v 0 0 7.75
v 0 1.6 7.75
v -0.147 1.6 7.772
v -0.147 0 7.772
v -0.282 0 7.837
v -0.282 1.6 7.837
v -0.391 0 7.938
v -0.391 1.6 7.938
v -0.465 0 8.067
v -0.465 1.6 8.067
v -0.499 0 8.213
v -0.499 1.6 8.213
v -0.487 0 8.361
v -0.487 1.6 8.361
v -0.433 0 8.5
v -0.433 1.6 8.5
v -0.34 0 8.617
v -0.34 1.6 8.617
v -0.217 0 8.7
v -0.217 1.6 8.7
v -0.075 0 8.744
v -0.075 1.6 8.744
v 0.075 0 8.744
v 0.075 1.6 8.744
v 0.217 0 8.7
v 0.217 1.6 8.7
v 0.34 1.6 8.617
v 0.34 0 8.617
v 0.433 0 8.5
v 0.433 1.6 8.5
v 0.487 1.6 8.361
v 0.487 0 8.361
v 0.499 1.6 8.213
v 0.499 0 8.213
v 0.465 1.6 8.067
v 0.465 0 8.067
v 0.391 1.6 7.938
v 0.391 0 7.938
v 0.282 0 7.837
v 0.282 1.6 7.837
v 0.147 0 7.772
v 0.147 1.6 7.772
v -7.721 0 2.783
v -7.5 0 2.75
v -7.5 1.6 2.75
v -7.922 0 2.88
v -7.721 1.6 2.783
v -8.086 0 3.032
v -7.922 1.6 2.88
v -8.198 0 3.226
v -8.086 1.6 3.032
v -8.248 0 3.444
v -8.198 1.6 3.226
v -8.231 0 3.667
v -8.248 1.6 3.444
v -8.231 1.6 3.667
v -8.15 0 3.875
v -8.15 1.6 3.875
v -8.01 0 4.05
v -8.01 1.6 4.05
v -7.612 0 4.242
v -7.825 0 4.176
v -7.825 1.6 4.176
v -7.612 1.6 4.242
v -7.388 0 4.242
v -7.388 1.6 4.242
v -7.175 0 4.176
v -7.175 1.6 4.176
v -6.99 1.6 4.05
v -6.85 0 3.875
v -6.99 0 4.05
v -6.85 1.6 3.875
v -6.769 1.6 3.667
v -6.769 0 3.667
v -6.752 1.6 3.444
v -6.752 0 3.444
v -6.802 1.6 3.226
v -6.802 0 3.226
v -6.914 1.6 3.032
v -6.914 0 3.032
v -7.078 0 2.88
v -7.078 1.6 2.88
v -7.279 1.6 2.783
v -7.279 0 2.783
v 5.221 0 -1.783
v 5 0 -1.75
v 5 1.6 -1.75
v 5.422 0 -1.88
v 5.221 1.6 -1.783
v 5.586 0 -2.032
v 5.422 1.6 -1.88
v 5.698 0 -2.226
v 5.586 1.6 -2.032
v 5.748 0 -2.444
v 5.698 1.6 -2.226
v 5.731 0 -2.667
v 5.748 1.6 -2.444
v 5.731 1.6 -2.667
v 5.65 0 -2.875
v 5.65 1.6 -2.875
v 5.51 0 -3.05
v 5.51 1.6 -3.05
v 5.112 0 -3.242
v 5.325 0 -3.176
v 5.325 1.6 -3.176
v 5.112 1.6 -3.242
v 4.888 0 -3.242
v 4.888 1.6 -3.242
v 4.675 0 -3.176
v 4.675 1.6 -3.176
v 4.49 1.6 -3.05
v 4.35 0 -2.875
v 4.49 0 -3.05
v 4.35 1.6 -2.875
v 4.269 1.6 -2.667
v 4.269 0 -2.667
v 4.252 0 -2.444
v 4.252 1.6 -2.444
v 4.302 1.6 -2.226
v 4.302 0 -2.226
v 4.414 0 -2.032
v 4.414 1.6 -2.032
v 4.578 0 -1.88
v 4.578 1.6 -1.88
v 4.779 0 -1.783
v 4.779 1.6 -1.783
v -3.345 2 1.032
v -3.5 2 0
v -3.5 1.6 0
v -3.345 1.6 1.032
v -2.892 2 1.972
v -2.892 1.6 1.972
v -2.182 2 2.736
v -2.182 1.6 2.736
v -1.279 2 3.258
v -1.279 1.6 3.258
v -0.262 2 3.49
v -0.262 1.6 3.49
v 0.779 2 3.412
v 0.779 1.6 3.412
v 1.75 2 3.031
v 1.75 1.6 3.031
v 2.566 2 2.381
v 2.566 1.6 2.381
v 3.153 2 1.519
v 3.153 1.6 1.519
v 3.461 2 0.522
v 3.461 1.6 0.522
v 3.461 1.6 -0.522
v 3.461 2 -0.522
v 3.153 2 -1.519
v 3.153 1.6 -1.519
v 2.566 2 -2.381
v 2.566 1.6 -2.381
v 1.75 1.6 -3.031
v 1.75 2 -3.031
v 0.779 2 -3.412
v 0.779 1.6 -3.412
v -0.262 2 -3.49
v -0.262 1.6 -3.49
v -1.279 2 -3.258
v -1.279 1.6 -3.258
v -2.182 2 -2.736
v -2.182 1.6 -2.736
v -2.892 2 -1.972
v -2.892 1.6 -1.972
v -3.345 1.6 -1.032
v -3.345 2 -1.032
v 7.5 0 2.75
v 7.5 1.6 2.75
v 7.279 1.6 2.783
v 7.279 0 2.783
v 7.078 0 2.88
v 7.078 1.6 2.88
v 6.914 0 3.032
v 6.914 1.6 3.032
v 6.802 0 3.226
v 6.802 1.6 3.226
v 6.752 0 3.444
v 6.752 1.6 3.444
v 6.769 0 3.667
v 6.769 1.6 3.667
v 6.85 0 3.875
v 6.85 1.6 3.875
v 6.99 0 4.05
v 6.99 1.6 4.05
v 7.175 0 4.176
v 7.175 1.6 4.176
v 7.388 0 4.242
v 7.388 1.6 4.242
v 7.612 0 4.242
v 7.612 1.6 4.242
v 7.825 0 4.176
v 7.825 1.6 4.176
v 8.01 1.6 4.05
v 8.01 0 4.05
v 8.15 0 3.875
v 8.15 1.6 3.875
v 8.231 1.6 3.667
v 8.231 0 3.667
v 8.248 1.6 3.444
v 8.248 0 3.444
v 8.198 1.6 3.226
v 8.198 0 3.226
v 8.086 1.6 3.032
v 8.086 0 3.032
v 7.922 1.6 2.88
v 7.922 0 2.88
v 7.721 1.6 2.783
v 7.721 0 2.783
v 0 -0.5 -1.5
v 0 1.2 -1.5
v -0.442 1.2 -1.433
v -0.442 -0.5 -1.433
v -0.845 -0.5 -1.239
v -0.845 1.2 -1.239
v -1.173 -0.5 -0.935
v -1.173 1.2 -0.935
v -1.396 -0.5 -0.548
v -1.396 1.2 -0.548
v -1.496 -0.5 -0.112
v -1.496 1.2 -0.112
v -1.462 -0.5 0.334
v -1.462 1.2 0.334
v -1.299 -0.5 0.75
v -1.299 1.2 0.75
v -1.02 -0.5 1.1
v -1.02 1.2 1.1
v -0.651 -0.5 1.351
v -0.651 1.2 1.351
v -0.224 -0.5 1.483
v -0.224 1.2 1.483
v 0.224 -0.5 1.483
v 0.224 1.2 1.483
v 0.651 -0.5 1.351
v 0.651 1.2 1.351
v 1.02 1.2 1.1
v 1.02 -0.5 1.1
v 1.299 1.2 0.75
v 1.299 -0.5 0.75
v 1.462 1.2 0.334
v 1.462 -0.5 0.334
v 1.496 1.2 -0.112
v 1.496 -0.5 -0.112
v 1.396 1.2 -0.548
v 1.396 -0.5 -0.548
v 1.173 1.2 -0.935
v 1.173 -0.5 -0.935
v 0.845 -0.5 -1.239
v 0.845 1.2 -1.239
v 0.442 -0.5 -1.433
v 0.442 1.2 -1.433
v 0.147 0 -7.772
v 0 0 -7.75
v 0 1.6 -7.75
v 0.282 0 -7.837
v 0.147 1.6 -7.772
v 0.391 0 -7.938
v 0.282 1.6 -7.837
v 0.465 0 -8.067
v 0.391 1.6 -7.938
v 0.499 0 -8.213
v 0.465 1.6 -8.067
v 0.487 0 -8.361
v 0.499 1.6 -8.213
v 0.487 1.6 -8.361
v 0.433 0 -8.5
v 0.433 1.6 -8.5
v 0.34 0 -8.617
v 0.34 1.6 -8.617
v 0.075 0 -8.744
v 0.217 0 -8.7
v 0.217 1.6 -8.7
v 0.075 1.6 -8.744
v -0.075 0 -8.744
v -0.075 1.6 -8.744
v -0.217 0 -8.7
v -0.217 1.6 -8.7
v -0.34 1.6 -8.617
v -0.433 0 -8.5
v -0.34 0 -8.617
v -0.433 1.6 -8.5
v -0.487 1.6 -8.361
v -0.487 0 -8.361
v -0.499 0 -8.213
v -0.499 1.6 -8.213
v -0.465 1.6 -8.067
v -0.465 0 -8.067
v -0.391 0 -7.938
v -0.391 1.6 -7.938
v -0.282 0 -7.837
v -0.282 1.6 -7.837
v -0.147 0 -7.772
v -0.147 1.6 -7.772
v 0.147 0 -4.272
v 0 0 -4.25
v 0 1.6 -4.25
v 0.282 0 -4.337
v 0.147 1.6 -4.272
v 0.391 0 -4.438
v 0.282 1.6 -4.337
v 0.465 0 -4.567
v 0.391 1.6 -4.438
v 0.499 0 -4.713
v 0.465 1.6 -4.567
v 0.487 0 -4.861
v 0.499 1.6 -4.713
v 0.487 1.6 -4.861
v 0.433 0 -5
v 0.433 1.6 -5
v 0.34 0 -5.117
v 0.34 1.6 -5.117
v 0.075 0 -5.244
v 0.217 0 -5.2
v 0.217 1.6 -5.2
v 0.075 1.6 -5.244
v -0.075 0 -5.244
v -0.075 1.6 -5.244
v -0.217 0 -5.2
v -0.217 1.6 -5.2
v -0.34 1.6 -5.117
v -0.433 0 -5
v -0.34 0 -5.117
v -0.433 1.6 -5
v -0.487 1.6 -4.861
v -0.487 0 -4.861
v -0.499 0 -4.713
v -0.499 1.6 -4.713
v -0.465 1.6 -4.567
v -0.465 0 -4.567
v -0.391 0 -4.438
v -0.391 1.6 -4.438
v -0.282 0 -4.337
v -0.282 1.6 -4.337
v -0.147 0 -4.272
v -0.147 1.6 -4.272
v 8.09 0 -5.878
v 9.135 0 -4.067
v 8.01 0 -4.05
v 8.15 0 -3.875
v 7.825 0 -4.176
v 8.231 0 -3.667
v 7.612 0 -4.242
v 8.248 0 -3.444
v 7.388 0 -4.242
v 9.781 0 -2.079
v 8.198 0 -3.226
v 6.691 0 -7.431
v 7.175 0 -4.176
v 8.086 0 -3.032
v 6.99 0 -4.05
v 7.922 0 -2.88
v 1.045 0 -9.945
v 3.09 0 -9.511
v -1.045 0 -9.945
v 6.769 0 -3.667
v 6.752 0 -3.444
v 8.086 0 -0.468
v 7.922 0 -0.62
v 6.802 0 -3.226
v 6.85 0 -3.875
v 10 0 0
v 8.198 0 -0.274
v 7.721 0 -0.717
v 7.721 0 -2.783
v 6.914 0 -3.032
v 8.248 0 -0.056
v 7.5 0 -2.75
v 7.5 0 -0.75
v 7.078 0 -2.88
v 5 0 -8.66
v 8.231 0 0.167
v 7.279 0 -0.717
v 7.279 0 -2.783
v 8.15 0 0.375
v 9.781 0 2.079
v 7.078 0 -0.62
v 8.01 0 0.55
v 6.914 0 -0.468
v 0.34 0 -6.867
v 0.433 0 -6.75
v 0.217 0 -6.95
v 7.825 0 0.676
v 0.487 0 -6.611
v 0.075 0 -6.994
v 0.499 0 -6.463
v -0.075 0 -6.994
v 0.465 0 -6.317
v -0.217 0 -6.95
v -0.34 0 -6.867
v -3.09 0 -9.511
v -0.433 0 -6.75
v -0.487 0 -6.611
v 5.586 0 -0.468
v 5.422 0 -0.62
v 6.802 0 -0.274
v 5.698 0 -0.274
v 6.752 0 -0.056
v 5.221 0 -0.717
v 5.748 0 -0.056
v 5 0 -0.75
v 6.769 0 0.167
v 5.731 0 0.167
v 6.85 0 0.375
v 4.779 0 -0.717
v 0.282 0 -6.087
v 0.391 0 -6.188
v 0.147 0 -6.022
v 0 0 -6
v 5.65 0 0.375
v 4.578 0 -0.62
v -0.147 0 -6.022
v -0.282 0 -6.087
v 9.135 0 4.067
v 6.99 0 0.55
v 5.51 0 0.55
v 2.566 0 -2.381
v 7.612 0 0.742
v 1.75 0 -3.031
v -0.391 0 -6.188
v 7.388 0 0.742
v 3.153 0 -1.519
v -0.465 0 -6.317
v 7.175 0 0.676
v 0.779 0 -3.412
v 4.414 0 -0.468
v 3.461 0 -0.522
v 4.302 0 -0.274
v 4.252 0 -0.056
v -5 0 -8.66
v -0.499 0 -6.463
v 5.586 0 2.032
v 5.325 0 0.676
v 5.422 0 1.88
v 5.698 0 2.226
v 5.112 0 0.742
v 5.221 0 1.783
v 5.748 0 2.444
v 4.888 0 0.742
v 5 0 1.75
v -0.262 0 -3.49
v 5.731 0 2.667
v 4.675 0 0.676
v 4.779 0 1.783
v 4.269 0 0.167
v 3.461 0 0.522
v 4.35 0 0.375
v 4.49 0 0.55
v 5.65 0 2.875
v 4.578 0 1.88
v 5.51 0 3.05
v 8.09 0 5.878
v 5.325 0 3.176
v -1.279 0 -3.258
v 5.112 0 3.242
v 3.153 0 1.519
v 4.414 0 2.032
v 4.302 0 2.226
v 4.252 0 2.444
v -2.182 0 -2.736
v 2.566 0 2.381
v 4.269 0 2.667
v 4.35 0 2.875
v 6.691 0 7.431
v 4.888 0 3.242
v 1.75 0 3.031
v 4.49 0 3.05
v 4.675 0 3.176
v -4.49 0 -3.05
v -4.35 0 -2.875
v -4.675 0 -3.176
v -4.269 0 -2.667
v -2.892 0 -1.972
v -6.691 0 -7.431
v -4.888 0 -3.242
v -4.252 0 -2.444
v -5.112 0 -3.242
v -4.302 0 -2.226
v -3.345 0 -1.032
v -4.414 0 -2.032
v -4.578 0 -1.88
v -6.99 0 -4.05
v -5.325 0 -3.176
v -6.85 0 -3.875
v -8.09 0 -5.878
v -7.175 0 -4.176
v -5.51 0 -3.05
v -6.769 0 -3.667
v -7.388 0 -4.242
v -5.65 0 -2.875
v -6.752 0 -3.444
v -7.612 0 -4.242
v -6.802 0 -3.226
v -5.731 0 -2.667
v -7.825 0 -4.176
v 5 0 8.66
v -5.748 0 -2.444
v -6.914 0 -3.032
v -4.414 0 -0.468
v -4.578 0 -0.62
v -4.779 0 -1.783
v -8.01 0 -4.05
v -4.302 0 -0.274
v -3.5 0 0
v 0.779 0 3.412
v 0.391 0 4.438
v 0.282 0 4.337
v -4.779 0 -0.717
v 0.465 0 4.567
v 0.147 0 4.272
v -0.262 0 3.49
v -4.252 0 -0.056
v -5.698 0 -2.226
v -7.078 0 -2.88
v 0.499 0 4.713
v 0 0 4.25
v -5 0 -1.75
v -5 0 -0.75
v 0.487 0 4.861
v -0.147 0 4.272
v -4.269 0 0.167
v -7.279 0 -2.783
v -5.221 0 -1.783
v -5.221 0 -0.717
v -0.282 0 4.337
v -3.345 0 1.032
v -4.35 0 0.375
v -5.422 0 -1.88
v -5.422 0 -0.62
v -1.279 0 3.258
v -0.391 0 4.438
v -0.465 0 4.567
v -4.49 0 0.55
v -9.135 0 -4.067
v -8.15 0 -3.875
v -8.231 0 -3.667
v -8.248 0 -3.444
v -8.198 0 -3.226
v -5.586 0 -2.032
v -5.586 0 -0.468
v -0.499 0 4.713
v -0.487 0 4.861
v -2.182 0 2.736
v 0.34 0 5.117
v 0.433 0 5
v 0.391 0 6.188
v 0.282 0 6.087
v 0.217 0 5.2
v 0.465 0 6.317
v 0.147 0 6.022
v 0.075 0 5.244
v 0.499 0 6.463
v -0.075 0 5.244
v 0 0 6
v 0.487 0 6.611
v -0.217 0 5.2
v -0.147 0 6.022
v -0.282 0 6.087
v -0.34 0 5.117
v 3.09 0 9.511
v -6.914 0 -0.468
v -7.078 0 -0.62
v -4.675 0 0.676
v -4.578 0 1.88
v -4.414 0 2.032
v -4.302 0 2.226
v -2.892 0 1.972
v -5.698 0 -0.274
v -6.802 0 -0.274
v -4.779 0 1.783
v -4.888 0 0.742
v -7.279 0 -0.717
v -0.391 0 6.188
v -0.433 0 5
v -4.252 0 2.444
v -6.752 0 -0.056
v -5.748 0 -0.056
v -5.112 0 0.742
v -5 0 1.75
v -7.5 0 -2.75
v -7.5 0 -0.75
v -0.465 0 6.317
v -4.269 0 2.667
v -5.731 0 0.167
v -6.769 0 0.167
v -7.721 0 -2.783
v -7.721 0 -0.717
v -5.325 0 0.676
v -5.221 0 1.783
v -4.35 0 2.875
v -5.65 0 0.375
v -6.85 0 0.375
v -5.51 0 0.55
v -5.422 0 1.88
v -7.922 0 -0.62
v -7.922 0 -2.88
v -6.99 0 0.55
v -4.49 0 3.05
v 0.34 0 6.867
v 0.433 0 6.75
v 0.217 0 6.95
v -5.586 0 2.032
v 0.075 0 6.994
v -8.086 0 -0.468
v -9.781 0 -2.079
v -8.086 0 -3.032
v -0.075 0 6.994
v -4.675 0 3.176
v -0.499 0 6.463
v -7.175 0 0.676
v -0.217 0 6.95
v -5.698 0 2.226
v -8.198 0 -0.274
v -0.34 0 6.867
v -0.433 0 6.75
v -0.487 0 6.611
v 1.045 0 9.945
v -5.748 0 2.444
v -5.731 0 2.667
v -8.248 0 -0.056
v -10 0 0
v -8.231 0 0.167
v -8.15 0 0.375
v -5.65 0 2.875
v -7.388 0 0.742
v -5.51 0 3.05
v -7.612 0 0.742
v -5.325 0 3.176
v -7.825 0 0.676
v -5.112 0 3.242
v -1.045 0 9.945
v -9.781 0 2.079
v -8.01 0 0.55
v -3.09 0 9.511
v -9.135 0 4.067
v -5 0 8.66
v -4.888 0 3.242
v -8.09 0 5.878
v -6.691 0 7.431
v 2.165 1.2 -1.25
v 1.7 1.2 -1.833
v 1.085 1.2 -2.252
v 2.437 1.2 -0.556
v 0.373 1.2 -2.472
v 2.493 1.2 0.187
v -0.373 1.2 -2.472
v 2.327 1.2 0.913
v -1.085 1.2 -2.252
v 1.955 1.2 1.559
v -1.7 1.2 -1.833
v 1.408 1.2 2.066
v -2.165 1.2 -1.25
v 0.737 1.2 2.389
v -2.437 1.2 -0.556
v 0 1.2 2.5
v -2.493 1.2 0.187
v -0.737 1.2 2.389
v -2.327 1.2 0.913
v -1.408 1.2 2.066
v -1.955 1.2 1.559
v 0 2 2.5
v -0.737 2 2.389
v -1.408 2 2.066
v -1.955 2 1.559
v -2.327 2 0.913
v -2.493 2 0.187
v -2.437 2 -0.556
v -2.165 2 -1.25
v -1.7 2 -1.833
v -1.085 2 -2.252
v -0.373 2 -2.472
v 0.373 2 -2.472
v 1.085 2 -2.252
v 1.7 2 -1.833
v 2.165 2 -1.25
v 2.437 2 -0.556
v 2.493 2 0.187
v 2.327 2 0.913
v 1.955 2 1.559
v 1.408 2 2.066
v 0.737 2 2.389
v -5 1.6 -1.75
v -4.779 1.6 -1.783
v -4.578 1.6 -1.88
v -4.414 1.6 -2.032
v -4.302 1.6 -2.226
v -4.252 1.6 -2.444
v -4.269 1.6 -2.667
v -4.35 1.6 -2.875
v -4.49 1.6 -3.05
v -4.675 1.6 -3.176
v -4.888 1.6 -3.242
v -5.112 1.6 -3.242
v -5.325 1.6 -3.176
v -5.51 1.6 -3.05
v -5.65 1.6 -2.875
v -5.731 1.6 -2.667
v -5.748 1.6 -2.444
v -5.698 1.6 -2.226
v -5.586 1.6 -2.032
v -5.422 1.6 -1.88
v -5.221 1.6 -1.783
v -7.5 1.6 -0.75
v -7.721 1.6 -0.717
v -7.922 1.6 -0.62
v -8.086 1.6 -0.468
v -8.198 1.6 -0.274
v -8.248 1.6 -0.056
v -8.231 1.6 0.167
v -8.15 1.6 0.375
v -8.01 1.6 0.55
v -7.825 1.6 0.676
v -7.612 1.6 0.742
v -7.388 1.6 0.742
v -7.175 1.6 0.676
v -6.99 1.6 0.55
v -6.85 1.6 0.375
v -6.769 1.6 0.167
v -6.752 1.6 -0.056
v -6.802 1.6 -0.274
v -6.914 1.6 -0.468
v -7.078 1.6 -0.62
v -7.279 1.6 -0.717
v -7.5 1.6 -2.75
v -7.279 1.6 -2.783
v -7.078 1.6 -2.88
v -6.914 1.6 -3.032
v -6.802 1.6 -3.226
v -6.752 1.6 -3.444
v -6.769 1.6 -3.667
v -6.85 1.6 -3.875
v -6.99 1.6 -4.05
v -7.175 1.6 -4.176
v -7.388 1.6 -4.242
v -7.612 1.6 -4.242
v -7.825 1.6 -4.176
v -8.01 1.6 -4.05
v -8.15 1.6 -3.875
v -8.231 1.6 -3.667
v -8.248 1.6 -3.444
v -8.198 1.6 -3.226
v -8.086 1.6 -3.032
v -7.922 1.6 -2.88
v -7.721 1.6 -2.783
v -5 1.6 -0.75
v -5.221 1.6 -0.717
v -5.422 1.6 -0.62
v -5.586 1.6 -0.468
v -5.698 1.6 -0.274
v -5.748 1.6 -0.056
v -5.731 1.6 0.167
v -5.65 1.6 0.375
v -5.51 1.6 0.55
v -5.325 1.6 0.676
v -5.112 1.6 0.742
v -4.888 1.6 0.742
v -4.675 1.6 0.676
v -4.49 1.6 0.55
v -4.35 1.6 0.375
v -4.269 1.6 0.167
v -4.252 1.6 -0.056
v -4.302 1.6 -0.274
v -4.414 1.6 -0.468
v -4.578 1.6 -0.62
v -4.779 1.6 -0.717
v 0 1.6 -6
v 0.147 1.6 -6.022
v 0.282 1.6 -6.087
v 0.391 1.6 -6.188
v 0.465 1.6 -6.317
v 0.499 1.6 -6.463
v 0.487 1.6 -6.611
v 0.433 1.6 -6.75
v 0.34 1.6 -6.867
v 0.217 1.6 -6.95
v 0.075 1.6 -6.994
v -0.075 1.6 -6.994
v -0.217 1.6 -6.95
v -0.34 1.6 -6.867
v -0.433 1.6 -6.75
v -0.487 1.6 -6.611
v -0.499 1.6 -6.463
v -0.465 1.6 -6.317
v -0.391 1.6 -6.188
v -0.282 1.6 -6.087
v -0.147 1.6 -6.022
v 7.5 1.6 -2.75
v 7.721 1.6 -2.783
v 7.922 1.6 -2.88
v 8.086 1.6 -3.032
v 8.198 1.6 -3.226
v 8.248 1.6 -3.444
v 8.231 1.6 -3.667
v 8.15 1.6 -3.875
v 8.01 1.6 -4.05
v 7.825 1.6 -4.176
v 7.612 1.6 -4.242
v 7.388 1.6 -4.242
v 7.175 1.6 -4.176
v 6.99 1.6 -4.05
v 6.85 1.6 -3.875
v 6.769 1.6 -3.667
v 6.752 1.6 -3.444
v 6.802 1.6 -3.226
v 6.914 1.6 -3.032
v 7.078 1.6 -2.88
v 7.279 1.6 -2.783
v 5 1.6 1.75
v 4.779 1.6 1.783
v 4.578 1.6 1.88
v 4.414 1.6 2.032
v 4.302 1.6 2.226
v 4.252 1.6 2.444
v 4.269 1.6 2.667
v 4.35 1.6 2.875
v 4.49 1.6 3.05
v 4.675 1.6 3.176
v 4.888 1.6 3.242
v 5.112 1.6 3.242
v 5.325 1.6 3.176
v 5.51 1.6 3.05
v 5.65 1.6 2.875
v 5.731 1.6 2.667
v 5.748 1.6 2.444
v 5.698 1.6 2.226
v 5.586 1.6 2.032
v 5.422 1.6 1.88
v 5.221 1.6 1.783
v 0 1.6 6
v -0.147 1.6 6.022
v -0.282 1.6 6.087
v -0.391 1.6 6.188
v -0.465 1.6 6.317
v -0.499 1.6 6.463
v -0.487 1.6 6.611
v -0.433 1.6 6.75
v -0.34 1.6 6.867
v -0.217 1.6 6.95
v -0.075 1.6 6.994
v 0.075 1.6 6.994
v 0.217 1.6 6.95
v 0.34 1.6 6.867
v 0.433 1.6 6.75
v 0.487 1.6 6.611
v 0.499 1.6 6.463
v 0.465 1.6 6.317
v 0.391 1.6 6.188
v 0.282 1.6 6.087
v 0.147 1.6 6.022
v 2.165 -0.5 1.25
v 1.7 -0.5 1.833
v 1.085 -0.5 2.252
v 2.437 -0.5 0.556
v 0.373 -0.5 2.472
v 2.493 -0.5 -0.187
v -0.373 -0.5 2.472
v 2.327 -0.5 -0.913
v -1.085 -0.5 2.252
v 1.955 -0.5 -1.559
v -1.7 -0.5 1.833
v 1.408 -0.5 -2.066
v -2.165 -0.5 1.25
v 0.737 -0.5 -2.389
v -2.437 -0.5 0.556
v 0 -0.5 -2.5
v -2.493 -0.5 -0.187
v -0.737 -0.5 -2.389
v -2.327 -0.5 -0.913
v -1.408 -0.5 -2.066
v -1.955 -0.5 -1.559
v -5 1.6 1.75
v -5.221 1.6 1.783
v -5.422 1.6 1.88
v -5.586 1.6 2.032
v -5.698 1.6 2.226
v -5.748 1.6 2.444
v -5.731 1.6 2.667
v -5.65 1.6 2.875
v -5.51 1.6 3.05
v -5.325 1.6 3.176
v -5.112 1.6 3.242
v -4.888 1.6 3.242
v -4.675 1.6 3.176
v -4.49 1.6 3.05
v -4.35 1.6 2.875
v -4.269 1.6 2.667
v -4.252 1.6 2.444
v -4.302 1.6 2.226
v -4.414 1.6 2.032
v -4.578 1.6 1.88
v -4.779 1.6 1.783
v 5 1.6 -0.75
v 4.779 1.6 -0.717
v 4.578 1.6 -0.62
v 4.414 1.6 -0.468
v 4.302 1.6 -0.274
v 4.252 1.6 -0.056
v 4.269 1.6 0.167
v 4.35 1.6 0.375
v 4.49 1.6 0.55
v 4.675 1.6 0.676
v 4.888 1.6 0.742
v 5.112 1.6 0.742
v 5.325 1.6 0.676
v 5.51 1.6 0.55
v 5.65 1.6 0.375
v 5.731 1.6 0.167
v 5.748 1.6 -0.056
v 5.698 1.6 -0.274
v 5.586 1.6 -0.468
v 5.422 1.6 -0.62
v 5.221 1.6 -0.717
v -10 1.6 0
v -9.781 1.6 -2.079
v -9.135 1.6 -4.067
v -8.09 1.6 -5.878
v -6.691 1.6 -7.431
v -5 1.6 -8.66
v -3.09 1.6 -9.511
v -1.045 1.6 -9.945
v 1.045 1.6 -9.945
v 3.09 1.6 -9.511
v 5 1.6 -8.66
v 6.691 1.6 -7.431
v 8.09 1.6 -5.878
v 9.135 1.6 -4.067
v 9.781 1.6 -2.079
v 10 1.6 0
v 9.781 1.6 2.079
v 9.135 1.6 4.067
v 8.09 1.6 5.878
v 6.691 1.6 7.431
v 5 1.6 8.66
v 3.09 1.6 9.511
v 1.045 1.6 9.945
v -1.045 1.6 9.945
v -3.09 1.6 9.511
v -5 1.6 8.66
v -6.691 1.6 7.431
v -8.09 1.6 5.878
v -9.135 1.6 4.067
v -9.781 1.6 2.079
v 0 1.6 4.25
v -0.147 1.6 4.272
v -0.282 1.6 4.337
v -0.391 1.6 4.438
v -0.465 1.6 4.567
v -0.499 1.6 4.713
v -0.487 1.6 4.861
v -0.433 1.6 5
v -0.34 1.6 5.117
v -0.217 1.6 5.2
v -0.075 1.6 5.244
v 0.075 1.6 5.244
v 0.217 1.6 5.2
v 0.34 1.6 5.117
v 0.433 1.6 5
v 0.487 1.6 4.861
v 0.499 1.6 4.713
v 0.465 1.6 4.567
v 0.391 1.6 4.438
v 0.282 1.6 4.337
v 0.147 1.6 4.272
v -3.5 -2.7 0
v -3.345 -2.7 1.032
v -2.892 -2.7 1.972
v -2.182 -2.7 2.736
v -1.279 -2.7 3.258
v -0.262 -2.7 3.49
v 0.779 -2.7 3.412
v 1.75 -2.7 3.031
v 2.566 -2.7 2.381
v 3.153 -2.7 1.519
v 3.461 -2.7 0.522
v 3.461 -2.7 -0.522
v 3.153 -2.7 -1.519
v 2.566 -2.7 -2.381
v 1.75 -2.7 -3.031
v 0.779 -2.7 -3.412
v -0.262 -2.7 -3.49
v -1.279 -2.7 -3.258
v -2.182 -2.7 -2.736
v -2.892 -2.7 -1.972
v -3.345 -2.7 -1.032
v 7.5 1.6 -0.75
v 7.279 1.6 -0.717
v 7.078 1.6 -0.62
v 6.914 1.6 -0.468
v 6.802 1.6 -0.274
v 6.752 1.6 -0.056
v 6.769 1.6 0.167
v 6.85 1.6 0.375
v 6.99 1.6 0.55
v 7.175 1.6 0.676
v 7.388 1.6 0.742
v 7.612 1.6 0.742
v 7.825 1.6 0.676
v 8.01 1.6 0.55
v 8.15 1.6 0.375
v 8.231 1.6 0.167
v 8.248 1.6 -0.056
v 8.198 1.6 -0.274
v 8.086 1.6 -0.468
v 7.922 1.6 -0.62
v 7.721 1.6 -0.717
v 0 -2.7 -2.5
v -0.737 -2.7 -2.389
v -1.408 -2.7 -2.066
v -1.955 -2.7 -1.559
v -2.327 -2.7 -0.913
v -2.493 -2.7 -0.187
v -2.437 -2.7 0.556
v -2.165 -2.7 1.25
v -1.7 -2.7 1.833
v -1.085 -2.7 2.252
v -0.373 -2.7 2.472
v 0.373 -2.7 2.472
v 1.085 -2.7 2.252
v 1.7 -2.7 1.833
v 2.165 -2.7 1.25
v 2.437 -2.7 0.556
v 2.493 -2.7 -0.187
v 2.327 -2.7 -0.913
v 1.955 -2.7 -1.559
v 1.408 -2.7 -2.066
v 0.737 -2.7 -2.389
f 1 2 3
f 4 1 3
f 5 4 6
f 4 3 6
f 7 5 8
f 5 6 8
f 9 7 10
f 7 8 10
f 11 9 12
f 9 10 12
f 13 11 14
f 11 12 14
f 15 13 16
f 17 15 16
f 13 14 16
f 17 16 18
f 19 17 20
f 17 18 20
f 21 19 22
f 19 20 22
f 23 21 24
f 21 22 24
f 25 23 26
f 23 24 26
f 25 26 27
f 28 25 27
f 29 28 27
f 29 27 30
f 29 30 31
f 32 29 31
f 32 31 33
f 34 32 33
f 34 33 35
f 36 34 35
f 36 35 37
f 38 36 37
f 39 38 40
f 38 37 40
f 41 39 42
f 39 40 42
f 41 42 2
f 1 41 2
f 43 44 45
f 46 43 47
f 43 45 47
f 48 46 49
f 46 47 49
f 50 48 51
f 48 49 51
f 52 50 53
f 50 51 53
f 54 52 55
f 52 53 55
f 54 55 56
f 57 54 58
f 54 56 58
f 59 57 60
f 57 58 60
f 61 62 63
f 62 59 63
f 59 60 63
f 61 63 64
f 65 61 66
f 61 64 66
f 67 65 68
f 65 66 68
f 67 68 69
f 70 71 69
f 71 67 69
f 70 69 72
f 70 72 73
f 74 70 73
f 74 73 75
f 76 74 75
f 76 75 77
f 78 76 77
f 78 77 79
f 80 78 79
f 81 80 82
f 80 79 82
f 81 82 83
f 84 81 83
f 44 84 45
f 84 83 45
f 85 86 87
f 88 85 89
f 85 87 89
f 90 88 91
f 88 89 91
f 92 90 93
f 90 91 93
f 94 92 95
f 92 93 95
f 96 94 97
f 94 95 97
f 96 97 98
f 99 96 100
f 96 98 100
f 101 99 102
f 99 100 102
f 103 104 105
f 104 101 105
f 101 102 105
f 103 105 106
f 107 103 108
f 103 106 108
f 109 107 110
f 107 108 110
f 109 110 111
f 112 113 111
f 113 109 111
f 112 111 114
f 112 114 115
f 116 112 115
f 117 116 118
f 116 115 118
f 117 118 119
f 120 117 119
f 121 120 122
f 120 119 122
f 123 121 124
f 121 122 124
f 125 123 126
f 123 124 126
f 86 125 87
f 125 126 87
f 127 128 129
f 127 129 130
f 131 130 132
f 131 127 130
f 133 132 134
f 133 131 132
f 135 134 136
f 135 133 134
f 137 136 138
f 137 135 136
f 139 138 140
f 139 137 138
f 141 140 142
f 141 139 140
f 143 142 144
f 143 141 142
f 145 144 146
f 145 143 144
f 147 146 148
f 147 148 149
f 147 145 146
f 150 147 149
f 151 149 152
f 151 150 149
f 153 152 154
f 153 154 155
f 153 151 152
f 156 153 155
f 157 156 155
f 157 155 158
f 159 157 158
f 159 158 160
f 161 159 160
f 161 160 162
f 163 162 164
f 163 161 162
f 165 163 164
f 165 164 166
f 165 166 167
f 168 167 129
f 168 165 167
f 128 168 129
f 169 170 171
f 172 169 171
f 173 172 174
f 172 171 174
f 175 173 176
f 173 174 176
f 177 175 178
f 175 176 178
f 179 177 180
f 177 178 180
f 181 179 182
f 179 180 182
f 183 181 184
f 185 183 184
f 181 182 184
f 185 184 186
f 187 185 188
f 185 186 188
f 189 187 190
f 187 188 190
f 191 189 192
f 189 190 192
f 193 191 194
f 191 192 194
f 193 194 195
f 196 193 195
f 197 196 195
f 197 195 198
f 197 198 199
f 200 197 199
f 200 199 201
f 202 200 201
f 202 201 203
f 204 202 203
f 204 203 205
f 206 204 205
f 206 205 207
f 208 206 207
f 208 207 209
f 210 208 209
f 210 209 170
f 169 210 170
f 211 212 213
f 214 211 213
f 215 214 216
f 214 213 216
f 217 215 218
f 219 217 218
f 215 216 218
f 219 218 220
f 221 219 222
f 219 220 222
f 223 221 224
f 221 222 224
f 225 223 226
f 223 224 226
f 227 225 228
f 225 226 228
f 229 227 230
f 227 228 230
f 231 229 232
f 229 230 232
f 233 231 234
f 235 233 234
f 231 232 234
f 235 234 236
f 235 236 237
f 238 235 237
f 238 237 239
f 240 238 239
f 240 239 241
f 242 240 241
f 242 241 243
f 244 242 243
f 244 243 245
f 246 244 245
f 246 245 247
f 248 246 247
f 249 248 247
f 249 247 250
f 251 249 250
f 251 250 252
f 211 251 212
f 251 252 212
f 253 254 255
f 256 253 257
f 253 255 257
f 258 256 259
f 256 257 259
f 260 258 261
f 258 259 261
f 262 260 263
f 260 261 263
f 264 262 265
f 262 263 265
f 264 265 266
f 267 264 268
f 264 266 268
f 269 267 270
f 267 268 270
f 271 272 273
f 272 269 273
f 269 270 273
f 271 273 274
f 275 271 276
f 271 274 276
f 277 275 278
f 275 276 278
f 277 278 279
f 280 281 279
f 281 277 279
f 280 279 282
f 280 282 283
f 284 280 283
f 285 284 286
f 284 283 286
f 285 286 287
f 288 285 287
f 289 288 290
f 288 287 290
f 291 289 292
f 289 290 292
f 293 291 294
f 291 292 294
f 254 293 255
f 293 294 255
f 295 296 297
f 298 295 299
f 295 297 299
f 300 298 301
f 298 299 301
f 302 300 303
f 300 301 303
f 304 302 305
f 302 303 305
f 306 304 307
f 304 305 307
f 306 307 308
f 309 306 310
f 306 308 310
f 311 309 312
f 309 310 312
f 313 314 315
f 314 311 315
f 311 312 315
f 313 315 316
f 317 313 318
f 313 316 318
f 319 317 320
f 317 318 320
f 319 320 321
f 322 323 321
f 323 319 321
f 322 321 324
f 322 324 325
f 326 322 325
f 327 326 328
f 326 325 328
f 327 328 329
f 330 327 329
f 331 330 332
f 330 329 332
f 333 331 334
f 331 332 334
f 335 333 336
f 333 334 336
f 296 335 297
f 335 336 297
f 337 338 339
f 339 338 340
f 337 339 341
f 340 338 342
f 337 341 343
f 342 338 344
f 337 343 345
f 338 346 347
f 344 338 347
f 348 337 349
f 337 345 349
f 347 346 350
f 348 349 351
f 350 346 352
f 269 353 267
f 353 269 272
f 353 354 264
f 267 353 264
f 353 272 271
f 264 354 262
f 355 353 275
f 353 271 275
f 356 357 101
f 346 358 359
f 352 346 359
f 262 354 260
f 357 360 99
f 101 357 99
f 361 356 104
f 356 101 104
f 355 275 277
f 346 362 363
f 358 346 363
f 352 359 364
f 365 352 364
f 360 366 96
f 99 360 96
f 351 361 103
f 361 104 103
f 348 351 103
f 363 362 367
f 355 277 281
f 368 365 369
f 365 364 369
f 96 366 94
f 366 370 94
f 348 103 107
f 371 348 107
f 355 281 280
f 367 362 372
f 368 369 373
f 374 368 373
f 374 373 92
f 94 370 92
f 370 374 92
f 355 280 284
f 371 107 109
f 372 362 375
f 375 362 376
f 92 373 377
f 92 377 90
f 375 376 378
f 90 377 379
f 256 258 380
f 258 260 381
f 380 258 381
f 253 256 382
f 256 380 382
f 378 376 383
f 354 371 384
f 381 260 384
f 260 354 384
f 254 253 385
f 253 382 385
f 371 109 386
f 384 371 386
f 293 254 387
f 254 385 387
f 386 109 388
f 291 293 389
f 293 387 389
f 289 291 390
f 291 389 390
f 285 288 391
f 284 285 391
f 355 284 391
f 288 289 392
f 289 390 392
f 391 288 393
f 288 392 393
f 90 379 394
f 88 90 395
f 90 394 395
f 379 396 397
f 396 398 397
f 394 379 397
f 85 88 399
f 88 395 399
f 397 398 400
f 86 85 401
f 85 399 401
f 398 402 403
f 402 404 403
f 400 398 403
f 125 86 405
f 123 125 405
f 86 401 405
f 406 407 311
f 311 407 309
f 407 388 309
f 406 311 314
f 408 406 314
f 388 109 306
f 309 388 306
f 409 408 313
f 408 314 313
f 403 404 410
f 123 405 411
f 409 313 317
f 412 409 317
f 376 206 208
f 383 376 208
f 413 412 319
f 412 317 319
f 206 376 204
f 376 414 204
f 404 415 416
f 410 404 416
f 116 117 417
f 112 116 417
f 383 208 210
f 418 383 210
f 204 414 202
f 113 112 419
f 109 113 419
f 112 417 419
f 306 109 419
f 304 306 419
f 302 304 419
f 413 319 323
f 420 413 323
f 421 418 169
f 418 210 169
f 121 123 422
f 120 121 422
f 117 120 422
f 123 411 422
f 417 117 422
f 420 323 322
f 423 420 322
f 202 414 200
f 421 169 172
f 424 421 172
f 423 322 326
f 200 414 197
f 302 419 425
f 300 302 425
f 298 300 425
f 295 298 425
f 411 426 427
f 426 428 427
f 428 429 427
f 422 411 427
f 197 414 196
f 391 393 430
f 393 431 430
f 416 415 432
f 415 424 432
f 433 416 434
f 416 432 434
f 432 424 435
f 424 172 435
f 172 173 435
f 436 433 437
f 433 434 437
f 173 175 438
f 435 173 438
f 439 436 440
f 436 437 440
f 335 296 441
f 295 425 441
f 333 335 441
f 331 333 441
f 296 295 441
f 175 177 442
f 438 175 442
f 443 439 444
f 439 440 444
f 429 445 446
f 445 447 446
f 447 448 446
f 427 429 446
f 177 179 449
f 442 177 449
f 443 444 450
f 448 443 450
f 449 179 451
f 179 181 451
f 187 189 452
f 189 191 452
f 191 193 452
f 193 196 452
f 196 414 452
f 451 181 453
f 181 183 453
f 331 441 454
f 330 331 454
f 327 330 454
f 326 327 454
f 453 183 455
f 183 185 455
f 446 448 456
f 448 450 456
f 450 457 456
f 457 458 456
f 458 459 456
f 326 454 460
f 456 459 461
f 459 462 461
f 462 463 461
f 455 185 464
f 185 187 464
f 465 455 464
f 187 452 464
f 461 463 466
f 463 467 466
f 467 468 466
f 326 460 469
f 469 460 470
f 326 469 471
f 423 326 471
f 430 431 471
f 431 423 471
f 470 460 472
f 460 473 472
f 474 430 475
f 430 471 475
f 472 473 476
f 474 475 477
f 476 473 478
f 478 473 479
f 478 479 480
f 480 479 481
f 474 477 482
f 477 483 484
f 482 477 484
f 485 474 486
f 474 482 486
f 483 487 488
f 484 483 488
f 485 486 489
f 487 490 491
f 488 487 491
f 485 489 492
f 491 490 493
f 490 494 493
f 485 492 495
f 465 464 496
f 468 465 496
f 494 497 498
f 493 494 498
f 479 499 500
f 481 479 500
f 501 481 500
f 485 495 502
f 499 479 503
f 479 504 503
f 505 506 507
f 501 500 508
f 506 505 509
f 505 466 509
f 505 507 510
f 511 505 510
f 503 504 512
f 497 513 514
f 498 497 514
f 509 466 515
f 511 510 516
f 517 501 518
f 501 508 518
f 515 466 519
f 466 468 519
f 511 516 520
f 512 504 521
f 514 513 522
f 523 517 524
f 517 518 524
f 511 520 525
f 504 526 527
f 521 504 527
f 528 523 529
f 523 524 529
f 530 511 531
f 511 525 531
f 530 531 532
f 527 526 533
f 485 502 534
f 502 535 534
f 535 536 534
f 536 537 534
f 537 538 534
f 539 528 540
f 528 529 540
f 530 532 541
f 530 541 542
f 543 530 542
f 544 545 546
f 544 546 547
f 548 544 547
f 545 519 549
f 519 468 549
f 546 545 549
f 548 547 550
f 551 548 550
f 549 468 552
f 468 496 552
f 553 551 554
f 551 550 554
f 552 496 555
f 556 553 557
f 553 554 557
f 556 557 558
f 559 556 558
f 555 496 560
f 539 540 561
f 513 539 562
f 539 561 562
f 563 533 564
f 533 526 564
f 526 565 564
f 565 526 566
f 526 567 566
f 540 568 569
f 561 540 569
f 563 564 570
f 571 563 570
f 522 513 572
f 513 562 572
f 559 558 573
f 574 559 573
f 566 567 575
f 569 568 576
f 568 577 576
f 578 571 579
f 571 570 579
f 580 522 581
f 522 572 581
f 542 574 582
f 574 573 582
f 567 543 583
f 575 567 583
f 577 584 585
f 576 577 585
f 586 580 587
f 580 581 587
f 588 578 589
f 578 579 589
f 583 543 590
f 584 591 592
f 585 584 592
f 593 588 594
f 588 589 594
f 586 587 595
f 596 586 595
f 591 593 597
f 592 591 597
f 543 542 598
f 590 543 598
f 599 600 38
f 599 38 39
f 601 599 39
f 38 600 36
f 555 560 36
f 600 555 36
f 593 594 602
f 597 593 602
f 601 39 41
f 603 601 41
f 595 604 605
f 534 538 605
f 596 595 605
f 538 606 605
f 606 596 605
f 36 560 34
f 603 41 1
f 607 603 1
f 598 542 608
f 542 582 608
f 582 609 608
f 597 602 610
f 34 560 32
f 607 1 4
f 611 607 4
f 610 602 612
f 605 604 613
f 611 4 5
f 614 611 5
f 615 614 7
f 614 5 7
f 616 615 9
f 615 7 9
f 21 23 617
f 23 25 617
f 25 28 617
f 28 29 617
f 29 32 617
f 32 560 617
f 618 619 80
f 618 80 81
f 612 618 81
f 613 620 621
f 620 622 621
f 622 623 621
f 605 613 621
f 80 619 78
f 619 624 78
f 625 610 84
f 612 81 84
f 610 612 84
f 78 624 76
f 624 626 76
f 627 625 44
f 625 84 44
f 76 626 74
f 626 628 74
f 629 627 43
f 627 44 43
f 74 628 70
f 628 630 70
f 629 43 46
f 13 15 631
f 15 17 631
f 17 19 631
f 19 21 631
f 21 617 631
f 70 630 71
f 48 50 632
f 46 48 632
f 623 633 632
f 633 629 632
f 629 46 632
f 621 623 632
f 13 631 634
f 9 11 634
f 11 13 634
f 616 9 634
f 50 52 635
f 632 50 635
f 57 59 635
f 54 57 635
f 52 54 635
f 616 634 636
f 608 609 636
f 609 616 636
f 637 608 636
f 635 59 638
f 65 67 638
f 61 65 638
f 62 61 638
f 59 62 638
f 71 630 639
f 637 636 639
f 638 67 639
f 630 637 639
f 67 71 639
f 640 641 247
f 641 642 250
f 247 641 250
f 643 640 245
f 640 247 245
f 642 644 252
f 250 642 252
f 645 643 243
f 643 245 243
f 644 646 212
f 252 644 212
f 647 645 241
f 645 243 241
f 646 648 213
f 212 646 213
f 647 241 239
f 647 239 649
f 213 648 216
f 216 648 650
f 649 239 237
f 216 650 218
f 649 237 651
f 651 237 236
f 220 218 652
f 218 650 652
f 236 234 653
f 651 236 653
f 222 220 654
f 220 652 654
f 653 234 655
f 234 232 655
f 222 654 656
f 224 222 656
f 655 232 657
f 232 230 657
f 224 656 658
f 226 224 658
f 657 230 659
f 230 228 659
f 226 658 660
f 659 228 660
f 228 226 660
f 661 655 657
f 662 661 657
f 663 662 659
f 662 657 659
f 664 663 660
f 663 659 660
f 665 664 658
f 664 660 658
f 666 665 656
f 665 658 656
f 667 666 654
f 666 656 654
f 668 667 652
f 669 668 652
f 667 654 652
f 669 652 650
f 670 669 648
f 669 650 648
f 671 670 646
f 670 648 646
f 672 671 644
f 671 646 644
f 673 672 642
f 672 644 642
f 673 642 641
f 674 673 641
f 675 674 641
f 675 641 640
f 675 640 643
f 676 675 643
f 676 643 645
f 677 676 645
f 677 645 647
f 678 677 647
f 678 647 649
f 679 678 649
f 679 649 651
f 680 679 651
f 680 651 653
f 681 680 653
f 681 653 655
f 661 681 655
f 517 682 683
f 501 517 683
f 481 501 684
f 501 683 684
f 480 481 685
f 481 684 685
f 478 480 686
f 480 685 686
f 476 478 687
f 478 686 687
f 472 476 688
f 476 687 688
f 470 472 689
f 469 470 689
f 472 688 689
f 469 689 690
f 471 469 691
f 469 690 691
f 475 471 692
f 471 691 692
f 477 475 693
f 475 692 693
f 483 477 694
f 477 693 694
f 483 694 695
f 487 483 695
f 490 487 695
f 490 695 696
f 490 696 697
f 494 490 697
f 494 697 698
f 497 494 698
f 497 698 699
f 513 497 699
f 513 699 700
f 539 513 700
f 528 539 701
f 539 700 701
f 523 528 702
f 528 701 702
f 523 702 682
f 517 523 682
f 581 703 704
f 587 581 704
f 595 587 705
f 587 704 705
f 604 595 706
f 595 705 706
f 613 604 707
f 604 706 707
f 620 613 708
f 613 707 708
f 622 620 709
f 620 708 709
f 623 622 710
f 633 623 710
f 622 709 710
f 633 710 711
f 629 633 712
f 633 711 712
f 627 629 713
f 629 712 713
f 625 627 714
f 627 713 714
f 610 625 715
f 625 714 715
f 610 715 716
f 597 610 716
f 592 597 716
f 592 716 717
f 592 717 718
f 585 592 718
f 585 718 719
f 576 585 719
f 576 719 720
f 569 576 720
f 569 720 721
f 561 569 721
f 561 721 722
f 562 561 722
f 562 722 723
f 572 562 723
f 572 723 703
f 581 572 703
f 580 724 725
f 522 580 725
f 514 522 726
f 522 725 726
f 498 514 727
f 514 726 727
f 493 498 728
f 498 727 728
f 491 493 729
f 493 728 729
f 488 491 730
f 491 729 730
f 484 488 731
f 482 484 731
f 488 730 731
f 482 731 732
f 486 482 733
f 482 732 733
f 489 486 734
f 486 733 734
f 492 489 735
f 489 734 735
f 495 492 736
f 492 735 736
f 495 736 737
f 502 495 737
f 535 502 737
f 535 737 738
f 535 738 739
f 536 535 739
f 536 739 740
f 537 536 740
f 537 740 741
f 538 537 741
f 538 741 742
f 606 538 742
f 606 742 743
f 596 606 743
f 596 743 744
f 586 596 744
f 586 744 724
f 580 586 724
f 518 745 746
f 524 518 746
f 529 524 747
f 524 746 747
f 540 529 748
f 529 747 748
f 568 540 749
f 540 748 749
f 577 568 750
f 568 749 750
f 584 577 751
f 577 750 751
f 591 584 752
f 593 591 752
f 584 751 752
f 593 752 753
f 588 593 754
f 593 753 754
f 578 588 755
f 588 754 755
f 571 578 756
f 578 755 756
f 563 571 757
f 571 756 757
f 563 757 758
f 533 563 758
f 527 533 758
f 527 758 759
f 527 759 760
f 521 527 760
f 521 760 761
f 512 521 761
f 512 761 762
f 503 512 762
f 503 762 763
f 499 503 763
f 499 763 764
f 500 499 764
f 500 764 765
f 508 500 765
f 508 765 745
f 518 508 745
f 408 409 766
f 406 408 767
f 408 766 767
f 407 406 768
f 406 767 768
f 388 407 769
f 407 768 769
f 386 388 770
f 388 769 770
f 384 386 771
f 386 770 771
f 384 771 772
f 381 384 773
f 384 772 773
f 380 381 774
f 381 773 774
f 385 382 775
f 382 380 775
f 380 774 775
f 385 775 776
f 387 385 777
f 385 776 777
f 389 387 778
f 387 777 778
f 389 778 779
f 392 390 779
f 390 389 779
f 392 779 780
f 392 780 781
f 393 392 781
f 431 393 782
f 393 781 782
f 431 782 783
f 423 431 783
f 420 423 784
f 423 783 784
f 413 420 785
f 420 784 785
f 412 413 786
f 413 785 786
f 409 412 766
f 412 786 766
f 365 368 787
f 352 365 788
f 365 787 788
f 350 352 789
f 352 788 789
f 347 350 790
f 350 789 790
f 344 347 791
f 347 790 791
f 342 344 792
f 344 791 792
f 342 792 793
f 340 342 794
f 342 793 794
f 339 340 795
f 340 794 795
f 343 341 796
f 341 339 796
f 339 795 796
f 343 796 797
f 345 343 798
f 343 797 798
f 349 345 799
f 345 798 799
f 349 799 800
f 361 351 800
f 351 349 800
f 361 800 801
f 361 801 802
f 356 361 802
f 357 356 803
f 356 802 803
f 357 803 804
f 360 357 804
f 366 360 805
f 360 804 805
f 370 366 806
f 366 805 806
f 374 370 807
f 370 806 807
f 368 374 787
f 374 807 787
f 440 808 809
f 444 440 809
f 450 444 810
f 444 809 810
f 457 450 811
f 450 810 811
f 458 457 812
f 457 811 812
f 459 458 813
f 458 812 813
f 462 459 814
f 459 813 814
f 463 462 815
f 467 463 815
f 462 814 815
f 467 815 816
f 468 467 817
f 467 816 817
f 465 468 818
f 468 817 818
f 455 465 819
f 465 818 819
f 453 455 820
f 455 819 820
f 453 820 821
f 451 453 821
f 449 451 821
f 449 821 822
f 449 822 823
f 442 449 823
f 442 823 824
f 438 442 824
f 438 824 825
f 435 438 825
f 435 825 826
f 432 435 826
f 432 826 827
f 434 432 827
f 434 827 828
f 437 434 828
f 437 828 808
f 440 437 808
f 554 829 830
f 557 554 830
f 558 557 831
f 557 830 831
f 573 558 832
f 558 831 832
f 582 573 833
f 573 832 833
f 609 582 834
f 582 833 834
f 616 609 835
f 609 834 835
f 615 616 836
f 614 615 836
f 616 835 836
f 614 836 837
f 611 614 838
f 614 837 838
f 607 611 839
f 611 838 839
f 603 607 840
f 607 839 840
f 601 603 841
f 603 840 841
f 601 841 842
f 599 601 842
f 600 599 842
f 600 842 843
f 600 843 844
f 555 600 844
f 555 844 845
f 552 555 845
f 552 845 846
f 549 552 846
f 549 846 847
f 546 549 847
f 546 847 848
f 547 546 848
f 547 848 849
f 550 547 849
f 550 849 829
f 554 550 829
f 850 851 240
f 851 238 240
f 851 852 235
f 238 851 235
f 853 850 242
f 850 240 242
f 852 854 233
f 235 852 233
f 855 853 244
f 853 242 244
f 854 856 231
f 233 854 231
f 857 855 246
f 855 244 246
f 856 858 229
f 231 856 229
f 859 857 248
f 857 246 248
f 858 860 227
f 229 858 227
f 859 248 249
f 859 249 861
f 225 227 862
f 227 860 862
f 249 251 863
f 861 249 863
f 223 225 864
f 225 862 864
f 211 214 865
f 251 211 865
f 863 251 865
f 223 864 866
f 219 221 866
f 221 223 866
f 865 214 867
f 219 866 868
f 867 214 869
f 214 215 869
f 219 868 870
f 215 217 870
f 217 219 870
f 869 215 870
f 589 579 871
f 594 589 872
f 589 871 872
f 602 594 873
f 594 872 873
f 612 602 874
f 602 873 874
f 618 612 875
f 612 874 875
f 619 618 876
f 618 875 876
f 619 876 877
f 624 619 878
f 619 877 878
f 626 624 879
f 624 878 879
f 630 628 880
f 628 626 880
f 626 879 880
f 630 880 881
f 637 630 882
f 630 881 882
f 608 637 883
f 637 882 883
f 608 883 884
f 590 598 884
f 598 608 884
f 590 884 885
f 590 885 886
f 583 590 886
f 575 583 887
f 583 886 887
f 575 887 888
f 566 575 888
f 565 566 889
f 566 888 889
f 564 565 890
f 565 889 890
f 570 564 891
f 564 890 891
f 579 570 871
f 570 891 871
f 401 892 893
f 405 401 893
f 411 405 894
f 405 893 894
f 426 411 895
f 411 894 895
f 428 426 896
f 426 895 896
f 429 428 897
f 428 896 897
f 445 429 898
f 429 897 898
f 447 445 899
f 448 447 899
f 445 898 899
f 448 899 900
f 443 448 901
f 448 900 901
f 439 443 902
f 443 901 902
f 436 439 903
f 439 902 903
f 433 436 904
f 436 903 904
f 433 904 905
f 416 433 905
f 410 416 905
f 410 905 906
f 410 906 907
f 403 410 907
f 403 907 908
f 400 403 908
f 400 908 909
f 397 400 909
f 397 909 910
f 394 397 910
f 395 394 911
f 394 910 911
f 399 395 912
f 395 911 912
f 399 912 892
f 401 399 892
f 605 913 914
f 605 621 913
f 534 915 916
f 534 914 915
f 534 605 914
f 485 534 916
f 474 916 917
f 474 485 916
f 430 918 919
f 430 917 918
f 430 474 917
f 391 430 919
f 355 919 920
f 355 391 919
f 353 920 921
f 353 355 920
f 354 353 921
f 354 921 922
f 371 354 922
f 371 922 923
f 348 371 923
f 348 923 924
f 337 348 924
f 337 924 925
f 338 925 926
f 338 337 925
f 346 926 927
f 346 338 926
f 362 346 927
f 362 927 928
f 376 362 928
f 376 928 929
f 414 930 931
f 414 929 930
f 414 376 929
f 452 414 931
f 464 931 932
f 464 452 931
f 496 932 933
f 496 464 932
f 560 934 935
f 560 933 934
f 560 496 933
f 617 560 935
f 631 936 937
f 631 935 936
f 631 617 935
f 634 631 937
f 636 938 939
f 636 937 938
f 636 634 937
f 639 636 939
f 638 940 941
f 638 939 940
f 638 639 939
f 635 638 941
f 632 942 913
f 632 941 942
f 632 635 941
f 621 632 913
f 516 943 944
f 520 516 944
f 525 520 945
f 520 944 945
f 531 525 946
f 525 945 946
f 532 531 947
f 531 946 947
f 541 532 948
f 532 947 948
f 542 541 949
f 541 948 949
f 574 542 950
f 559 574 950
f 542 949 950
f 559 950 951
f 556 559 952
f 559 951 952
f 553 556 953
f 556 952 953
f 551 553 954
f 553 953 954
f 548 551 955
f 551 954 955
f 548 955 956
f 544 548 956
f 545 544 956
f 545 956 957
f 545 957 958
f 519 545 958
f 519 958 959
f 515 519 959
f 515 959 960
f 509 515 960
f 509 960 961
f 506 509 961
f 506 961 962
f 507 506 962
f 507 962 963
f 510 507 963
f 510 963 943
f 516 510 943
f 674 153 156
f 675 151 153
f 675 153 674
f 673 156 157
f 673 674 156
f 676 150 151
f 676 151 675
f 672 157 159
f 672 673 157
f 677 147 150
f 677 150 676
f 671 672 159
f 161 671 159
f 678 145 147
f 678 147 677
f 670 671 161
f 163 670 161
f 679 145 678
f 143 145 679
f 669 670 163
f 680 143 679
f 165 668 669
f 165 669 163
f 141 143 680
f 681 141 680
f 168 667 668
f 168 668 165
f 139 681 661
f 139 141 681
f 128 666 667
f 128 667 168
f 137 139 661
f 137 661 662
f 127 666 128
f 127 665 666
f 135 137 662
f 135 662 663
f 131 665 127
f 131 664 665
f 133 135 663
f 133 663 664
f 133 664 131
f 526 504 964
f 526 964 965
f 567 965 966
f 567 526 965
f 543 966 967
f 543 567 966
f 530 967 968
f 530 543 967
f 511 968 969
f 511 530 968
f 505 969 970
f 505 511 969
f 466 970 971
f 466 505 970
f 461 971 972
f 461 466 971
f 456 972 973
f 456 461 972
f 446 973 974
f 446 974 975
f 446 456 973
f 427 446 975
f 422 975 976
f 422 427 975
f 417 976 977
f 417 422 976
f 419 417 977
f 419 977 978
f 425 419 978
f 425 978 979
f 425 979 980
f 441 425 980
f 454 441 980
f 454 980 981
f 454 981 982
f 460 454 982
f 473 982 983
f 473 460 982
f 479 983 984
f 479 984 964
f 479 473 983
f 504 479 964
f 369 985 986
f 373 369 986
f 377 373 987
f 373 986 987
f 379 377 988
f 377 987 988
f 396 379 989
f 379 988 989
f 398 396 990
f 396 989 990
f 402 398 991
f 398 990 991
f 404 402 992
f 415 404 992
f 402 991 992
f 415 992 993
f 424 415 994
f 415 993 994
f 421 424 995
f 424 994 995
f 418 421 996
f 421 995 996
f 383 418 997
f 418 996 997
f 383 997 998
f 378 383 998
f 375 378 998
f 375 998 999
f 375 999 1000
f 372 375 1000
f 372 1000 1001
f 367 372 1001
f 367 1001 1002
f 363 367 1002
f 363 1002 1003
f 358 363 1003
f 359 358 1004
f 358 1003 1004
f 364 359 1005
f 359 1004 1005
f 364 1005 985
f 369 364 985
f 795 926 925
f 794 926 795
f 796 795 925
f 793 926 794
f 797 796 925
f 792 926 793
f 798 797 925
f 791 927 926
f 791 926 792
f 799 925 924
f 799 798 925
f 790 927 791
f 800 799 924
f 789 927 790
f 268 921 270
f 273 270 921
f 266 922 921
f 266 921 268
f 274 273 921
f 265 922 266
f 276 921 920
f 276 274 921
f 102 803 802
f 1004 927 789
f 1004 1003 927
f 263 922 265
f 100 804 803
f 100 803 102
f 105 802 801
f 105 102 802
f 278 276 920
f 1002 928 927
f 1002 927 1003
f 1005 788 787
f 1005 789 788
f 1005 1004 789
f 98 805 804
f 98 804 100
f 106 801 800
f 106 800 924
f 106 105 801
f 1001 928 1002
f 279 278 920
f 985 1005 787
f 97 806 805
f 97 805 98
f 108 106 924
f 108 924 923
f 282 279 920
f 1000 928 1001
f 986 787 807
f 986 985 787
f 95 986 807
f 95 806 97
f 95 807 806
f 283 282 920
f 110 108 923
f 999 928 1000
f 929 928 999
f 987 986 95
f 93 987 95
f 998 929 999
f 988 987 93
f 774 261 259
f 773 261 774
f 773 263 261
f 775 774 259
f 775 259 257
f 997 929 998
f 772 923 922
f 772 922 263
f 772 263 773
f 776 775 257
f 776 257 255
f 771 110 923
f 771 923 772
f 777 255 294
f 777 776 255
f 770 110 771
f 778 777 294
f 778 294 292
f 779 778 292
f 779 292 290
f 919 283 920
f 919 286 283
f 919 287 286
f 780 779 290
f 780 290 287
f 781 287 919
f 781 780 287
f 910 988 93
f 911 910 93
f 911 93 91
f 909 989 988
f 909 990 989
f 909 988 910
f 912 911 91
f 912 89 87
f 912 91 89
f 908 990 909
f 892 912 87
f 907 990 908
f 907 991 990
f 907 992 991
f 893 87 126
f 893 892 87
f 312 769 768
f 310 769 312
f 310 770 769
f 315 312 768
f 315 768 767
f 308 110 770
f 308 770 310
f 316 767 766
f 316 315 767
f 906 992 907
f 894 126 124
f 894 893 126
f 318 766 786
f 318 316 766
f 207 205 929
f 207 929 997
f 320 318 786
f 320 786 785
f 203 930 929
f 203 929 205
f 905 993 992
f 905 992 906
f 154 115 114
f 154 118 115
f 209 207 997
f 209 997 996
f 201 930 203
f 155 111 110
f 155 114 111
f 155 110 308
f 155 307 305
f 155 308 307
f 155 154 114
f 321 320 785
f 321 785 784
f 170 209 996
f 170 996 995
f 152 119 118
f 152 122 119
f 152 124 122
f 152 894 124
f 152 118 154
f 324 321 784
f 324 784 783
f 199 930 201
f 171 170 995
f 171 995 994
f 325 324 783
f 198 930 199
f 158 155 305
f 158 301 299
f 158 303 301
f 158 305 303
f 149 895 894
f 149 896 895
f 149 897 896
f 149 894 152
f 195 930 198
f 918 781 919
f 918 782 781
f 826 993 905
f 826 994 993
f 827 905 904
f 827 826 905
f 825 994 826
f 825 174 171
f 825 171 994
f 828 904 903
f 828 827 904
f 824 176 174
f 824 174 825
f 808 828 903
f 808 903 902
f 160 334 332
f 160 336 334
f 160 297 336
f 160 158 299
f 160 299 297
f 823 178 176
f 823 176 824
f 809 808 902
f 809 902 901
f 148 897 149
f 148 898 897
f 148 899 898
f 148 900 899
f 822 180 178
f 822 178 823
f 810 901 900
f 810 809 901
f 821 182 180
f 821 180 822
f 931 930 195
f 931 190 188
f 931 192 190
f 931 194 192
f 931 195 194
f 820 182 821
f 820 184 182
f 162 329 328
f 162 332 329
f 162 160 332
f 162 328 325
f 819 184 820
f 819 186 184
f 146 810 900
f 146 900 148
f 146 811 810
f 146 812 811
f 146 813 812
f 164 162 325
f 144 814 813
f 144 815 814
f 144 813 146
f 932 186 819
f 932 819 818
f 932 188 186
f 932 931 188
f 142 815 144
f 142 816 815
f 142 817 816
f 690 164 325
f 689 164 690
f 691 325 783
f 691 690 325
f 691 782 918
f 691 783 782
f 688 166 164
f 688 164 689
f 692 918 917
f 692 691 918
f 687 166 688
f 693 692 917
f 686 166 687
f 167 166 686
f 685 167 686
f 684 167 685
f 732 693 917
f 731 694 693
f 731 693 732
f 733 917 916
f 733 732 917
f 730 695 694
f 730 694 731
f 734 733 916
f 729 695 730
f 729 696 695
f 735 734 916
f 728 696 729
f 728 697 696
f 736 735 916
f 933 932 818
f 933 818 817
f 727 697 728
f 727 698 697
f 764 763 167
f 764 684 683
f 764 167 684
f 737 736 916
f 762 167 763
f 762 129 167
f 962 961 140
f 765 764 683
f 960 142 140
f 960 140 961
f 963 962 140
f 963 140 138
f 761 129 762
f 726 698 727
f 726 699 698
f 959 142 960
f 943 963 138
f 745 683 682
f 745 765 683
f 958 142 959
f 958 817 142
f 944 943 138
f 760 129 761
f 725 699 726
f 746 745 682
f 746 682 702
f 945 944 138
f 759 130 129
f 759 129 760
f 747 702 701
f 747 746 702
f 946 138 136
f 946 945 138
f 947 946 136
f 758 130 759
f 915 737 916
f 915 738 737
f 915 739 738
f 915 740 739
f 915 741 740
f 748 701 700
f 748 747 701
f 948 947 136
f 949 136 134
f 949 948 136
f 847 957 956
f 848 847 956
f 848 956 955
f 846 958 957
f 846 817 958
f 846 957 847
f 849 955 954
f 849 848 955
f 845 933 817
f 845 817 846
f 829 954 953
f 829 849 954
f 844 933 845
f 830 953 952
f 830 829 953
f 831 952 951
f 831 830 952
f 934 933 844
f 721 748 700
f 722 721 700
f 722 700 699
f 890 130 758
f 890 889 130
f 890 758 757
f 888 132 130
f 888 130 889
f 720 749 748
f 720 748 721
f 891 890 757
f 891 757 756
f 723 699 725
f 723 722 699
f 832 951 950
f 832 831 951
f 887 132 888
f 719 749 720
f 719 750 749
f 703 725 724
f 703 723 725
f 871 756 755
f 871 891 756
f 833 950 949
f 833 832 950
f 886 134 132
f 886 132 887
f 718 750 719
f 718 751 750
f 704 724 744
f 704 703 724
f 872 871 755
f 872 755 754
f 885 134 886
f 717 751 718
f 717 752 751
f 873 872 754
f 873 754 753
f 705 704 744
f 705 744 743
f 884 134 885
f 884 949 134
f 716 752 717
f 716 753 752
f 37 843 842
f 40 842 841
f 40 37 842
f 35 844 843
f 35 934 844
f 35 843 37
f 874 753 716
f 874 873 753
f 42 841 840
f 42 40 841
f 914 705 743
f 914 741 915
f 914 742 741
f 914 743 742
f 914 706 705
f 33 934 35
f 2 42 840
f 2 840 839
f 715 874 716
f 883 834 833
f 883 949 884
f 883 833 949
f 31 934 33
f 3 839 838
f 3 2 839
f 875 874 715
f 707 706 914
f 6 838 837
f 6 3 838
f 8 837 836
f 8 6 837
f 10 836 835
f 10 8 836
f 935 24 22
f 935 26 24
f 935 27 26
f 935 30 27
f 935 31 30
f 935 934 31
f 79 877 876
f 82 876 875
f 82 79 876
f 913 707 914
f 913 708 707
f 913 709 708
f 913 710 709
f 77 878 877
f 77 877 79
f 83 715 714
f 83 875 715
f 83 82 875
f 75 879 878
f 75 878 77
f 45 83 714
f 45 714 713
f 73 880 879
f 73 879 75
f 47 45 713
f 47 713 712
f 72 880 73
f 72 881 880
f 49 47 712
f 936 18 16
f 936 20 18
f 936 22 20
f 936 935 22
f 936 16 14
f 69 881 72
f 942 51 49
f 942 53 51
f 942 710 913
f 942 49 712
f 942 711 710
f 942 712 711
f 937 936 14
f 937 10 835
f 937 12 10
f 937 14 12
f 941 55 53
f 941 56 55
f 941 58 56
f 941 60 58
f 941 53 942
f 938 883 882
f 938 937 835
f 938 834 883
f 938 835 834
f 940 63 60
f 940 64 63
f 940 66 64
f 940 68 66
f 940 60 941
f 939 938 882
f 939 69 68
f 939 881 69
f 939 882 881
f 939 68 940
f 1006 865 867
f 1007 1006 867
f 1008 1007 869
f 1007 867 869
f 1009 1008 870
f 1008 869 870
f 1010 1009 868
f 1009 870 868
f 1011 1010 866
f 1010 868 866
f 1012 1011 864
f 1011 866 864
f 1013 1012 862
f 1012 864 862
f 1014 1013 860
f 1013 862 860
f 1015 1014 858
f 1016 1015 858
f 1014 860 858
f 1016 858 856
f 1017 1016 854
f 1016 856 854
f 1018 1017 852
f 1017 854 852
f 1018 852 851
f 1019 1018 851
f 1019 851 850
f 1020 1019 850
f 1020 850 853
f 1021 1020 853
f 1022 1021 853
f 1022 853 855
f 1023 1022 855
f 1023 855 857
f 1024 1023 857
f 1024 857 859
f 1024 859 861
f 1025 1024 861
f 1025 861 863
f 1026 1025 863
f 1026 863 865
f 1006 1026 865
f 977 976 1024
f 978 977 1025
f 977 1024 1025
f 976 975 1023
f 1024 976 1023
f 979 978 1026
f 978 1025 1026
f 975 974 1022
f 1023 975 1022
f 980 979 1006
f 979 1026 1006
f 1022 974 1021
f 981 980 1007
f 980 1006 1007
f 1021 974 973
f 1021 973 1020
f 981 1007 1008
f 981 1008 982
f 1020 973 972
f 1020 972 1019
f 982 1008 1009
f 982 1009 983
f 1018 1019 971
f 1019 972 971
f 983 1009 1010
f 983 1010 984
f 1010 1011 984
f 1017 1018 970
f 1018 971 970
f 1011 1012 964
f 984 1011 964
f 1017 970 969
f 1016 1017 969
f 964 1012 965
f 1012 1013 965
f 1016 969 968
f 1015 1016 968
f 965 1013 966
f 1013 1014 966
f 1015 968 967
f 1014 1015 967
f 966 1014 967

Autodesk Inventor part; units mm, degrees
ref_plane "YZ Plane" through (0, 0, 0) normal (1, 0, 0) x (0, 1, 0)
ref_plane "XZ Plane" through (0, 0, 0) normal (0, 1, 0) x (-1, 0, 0)
ref_plane "XY Plane" through (0, 0, 0) normal (0, 0, 1) x (1, 0, 0)
sketch "Sketch1" plane through (0, 0, 0) normal (0, 1, 0) x (-1, 0, 0)
  circle A0 centre (0, 0) radius 3.5
  circle A1 centre (0, 0) radius 10
  line L0 (0, 0) -> (-7.5, 0) construction
  line L1 (0, 0) -> (0, 3.5) construction
  line L2 (0, 3.5) -> (0, 10) construction
  point P0 (-5, 0)
  point P1 (-7.5, 3.5)
  point P2 (-5, 2.5)
  point P3 (0, 4.75)
  dimension "d0" = 7
  dimension "d2" = 20
  dimension "d3" = 7.5
  dimension "d47" = 5
  dimension "d50" = 3.5
  dimension "d57" = 2.5
  dimension "d62" = 4.75
extrude "Extrusion1" add sketch "Sketch1" along normal blind 1.6 contours A0 | A1
extrude "Extrusion2" add sketch "Sketch1" against normal blind 2.7 and the other way blind 2 contours A0
hole "Hole2" at (0, -2.7, 0) direction (0, 1, 0) diameter 3 end through all
hole "Hole3" at (0, -2.7, 0) direction (0, 1, 0) diameter 5 depth 2.2
hole "Hole5" at (0, 2, 0) direction (0, -1, 0) diameter 5 depth 0.8
hole "Hole6" at (7.5, 0, 0) at (5, 0, 0) at (7.5, 0, 3.5) at (5, 0, 2.5) direction (0, 1, 0) diameter 1.5 end through all
mirror "Mirror1" about plane through (0, 0, 0) normal (1, 0, 0) of "Hole6"
hole "Hole7" at (0, 0, 4.75) direction (0, 1, 0) diameter 1 end through all
pattern_linear "Rectangular Pattern1" count 3 spacing 1.75 along (0, 0, 1) of "Hole7"
mirror "Mirror2" about plane through (0, 0, 0) normal (0, 0, 1) of "Hole6", "Mirror1", "Hole7", "Rectangular Pattern1"
properties part number "servo arm DS939HV round"
